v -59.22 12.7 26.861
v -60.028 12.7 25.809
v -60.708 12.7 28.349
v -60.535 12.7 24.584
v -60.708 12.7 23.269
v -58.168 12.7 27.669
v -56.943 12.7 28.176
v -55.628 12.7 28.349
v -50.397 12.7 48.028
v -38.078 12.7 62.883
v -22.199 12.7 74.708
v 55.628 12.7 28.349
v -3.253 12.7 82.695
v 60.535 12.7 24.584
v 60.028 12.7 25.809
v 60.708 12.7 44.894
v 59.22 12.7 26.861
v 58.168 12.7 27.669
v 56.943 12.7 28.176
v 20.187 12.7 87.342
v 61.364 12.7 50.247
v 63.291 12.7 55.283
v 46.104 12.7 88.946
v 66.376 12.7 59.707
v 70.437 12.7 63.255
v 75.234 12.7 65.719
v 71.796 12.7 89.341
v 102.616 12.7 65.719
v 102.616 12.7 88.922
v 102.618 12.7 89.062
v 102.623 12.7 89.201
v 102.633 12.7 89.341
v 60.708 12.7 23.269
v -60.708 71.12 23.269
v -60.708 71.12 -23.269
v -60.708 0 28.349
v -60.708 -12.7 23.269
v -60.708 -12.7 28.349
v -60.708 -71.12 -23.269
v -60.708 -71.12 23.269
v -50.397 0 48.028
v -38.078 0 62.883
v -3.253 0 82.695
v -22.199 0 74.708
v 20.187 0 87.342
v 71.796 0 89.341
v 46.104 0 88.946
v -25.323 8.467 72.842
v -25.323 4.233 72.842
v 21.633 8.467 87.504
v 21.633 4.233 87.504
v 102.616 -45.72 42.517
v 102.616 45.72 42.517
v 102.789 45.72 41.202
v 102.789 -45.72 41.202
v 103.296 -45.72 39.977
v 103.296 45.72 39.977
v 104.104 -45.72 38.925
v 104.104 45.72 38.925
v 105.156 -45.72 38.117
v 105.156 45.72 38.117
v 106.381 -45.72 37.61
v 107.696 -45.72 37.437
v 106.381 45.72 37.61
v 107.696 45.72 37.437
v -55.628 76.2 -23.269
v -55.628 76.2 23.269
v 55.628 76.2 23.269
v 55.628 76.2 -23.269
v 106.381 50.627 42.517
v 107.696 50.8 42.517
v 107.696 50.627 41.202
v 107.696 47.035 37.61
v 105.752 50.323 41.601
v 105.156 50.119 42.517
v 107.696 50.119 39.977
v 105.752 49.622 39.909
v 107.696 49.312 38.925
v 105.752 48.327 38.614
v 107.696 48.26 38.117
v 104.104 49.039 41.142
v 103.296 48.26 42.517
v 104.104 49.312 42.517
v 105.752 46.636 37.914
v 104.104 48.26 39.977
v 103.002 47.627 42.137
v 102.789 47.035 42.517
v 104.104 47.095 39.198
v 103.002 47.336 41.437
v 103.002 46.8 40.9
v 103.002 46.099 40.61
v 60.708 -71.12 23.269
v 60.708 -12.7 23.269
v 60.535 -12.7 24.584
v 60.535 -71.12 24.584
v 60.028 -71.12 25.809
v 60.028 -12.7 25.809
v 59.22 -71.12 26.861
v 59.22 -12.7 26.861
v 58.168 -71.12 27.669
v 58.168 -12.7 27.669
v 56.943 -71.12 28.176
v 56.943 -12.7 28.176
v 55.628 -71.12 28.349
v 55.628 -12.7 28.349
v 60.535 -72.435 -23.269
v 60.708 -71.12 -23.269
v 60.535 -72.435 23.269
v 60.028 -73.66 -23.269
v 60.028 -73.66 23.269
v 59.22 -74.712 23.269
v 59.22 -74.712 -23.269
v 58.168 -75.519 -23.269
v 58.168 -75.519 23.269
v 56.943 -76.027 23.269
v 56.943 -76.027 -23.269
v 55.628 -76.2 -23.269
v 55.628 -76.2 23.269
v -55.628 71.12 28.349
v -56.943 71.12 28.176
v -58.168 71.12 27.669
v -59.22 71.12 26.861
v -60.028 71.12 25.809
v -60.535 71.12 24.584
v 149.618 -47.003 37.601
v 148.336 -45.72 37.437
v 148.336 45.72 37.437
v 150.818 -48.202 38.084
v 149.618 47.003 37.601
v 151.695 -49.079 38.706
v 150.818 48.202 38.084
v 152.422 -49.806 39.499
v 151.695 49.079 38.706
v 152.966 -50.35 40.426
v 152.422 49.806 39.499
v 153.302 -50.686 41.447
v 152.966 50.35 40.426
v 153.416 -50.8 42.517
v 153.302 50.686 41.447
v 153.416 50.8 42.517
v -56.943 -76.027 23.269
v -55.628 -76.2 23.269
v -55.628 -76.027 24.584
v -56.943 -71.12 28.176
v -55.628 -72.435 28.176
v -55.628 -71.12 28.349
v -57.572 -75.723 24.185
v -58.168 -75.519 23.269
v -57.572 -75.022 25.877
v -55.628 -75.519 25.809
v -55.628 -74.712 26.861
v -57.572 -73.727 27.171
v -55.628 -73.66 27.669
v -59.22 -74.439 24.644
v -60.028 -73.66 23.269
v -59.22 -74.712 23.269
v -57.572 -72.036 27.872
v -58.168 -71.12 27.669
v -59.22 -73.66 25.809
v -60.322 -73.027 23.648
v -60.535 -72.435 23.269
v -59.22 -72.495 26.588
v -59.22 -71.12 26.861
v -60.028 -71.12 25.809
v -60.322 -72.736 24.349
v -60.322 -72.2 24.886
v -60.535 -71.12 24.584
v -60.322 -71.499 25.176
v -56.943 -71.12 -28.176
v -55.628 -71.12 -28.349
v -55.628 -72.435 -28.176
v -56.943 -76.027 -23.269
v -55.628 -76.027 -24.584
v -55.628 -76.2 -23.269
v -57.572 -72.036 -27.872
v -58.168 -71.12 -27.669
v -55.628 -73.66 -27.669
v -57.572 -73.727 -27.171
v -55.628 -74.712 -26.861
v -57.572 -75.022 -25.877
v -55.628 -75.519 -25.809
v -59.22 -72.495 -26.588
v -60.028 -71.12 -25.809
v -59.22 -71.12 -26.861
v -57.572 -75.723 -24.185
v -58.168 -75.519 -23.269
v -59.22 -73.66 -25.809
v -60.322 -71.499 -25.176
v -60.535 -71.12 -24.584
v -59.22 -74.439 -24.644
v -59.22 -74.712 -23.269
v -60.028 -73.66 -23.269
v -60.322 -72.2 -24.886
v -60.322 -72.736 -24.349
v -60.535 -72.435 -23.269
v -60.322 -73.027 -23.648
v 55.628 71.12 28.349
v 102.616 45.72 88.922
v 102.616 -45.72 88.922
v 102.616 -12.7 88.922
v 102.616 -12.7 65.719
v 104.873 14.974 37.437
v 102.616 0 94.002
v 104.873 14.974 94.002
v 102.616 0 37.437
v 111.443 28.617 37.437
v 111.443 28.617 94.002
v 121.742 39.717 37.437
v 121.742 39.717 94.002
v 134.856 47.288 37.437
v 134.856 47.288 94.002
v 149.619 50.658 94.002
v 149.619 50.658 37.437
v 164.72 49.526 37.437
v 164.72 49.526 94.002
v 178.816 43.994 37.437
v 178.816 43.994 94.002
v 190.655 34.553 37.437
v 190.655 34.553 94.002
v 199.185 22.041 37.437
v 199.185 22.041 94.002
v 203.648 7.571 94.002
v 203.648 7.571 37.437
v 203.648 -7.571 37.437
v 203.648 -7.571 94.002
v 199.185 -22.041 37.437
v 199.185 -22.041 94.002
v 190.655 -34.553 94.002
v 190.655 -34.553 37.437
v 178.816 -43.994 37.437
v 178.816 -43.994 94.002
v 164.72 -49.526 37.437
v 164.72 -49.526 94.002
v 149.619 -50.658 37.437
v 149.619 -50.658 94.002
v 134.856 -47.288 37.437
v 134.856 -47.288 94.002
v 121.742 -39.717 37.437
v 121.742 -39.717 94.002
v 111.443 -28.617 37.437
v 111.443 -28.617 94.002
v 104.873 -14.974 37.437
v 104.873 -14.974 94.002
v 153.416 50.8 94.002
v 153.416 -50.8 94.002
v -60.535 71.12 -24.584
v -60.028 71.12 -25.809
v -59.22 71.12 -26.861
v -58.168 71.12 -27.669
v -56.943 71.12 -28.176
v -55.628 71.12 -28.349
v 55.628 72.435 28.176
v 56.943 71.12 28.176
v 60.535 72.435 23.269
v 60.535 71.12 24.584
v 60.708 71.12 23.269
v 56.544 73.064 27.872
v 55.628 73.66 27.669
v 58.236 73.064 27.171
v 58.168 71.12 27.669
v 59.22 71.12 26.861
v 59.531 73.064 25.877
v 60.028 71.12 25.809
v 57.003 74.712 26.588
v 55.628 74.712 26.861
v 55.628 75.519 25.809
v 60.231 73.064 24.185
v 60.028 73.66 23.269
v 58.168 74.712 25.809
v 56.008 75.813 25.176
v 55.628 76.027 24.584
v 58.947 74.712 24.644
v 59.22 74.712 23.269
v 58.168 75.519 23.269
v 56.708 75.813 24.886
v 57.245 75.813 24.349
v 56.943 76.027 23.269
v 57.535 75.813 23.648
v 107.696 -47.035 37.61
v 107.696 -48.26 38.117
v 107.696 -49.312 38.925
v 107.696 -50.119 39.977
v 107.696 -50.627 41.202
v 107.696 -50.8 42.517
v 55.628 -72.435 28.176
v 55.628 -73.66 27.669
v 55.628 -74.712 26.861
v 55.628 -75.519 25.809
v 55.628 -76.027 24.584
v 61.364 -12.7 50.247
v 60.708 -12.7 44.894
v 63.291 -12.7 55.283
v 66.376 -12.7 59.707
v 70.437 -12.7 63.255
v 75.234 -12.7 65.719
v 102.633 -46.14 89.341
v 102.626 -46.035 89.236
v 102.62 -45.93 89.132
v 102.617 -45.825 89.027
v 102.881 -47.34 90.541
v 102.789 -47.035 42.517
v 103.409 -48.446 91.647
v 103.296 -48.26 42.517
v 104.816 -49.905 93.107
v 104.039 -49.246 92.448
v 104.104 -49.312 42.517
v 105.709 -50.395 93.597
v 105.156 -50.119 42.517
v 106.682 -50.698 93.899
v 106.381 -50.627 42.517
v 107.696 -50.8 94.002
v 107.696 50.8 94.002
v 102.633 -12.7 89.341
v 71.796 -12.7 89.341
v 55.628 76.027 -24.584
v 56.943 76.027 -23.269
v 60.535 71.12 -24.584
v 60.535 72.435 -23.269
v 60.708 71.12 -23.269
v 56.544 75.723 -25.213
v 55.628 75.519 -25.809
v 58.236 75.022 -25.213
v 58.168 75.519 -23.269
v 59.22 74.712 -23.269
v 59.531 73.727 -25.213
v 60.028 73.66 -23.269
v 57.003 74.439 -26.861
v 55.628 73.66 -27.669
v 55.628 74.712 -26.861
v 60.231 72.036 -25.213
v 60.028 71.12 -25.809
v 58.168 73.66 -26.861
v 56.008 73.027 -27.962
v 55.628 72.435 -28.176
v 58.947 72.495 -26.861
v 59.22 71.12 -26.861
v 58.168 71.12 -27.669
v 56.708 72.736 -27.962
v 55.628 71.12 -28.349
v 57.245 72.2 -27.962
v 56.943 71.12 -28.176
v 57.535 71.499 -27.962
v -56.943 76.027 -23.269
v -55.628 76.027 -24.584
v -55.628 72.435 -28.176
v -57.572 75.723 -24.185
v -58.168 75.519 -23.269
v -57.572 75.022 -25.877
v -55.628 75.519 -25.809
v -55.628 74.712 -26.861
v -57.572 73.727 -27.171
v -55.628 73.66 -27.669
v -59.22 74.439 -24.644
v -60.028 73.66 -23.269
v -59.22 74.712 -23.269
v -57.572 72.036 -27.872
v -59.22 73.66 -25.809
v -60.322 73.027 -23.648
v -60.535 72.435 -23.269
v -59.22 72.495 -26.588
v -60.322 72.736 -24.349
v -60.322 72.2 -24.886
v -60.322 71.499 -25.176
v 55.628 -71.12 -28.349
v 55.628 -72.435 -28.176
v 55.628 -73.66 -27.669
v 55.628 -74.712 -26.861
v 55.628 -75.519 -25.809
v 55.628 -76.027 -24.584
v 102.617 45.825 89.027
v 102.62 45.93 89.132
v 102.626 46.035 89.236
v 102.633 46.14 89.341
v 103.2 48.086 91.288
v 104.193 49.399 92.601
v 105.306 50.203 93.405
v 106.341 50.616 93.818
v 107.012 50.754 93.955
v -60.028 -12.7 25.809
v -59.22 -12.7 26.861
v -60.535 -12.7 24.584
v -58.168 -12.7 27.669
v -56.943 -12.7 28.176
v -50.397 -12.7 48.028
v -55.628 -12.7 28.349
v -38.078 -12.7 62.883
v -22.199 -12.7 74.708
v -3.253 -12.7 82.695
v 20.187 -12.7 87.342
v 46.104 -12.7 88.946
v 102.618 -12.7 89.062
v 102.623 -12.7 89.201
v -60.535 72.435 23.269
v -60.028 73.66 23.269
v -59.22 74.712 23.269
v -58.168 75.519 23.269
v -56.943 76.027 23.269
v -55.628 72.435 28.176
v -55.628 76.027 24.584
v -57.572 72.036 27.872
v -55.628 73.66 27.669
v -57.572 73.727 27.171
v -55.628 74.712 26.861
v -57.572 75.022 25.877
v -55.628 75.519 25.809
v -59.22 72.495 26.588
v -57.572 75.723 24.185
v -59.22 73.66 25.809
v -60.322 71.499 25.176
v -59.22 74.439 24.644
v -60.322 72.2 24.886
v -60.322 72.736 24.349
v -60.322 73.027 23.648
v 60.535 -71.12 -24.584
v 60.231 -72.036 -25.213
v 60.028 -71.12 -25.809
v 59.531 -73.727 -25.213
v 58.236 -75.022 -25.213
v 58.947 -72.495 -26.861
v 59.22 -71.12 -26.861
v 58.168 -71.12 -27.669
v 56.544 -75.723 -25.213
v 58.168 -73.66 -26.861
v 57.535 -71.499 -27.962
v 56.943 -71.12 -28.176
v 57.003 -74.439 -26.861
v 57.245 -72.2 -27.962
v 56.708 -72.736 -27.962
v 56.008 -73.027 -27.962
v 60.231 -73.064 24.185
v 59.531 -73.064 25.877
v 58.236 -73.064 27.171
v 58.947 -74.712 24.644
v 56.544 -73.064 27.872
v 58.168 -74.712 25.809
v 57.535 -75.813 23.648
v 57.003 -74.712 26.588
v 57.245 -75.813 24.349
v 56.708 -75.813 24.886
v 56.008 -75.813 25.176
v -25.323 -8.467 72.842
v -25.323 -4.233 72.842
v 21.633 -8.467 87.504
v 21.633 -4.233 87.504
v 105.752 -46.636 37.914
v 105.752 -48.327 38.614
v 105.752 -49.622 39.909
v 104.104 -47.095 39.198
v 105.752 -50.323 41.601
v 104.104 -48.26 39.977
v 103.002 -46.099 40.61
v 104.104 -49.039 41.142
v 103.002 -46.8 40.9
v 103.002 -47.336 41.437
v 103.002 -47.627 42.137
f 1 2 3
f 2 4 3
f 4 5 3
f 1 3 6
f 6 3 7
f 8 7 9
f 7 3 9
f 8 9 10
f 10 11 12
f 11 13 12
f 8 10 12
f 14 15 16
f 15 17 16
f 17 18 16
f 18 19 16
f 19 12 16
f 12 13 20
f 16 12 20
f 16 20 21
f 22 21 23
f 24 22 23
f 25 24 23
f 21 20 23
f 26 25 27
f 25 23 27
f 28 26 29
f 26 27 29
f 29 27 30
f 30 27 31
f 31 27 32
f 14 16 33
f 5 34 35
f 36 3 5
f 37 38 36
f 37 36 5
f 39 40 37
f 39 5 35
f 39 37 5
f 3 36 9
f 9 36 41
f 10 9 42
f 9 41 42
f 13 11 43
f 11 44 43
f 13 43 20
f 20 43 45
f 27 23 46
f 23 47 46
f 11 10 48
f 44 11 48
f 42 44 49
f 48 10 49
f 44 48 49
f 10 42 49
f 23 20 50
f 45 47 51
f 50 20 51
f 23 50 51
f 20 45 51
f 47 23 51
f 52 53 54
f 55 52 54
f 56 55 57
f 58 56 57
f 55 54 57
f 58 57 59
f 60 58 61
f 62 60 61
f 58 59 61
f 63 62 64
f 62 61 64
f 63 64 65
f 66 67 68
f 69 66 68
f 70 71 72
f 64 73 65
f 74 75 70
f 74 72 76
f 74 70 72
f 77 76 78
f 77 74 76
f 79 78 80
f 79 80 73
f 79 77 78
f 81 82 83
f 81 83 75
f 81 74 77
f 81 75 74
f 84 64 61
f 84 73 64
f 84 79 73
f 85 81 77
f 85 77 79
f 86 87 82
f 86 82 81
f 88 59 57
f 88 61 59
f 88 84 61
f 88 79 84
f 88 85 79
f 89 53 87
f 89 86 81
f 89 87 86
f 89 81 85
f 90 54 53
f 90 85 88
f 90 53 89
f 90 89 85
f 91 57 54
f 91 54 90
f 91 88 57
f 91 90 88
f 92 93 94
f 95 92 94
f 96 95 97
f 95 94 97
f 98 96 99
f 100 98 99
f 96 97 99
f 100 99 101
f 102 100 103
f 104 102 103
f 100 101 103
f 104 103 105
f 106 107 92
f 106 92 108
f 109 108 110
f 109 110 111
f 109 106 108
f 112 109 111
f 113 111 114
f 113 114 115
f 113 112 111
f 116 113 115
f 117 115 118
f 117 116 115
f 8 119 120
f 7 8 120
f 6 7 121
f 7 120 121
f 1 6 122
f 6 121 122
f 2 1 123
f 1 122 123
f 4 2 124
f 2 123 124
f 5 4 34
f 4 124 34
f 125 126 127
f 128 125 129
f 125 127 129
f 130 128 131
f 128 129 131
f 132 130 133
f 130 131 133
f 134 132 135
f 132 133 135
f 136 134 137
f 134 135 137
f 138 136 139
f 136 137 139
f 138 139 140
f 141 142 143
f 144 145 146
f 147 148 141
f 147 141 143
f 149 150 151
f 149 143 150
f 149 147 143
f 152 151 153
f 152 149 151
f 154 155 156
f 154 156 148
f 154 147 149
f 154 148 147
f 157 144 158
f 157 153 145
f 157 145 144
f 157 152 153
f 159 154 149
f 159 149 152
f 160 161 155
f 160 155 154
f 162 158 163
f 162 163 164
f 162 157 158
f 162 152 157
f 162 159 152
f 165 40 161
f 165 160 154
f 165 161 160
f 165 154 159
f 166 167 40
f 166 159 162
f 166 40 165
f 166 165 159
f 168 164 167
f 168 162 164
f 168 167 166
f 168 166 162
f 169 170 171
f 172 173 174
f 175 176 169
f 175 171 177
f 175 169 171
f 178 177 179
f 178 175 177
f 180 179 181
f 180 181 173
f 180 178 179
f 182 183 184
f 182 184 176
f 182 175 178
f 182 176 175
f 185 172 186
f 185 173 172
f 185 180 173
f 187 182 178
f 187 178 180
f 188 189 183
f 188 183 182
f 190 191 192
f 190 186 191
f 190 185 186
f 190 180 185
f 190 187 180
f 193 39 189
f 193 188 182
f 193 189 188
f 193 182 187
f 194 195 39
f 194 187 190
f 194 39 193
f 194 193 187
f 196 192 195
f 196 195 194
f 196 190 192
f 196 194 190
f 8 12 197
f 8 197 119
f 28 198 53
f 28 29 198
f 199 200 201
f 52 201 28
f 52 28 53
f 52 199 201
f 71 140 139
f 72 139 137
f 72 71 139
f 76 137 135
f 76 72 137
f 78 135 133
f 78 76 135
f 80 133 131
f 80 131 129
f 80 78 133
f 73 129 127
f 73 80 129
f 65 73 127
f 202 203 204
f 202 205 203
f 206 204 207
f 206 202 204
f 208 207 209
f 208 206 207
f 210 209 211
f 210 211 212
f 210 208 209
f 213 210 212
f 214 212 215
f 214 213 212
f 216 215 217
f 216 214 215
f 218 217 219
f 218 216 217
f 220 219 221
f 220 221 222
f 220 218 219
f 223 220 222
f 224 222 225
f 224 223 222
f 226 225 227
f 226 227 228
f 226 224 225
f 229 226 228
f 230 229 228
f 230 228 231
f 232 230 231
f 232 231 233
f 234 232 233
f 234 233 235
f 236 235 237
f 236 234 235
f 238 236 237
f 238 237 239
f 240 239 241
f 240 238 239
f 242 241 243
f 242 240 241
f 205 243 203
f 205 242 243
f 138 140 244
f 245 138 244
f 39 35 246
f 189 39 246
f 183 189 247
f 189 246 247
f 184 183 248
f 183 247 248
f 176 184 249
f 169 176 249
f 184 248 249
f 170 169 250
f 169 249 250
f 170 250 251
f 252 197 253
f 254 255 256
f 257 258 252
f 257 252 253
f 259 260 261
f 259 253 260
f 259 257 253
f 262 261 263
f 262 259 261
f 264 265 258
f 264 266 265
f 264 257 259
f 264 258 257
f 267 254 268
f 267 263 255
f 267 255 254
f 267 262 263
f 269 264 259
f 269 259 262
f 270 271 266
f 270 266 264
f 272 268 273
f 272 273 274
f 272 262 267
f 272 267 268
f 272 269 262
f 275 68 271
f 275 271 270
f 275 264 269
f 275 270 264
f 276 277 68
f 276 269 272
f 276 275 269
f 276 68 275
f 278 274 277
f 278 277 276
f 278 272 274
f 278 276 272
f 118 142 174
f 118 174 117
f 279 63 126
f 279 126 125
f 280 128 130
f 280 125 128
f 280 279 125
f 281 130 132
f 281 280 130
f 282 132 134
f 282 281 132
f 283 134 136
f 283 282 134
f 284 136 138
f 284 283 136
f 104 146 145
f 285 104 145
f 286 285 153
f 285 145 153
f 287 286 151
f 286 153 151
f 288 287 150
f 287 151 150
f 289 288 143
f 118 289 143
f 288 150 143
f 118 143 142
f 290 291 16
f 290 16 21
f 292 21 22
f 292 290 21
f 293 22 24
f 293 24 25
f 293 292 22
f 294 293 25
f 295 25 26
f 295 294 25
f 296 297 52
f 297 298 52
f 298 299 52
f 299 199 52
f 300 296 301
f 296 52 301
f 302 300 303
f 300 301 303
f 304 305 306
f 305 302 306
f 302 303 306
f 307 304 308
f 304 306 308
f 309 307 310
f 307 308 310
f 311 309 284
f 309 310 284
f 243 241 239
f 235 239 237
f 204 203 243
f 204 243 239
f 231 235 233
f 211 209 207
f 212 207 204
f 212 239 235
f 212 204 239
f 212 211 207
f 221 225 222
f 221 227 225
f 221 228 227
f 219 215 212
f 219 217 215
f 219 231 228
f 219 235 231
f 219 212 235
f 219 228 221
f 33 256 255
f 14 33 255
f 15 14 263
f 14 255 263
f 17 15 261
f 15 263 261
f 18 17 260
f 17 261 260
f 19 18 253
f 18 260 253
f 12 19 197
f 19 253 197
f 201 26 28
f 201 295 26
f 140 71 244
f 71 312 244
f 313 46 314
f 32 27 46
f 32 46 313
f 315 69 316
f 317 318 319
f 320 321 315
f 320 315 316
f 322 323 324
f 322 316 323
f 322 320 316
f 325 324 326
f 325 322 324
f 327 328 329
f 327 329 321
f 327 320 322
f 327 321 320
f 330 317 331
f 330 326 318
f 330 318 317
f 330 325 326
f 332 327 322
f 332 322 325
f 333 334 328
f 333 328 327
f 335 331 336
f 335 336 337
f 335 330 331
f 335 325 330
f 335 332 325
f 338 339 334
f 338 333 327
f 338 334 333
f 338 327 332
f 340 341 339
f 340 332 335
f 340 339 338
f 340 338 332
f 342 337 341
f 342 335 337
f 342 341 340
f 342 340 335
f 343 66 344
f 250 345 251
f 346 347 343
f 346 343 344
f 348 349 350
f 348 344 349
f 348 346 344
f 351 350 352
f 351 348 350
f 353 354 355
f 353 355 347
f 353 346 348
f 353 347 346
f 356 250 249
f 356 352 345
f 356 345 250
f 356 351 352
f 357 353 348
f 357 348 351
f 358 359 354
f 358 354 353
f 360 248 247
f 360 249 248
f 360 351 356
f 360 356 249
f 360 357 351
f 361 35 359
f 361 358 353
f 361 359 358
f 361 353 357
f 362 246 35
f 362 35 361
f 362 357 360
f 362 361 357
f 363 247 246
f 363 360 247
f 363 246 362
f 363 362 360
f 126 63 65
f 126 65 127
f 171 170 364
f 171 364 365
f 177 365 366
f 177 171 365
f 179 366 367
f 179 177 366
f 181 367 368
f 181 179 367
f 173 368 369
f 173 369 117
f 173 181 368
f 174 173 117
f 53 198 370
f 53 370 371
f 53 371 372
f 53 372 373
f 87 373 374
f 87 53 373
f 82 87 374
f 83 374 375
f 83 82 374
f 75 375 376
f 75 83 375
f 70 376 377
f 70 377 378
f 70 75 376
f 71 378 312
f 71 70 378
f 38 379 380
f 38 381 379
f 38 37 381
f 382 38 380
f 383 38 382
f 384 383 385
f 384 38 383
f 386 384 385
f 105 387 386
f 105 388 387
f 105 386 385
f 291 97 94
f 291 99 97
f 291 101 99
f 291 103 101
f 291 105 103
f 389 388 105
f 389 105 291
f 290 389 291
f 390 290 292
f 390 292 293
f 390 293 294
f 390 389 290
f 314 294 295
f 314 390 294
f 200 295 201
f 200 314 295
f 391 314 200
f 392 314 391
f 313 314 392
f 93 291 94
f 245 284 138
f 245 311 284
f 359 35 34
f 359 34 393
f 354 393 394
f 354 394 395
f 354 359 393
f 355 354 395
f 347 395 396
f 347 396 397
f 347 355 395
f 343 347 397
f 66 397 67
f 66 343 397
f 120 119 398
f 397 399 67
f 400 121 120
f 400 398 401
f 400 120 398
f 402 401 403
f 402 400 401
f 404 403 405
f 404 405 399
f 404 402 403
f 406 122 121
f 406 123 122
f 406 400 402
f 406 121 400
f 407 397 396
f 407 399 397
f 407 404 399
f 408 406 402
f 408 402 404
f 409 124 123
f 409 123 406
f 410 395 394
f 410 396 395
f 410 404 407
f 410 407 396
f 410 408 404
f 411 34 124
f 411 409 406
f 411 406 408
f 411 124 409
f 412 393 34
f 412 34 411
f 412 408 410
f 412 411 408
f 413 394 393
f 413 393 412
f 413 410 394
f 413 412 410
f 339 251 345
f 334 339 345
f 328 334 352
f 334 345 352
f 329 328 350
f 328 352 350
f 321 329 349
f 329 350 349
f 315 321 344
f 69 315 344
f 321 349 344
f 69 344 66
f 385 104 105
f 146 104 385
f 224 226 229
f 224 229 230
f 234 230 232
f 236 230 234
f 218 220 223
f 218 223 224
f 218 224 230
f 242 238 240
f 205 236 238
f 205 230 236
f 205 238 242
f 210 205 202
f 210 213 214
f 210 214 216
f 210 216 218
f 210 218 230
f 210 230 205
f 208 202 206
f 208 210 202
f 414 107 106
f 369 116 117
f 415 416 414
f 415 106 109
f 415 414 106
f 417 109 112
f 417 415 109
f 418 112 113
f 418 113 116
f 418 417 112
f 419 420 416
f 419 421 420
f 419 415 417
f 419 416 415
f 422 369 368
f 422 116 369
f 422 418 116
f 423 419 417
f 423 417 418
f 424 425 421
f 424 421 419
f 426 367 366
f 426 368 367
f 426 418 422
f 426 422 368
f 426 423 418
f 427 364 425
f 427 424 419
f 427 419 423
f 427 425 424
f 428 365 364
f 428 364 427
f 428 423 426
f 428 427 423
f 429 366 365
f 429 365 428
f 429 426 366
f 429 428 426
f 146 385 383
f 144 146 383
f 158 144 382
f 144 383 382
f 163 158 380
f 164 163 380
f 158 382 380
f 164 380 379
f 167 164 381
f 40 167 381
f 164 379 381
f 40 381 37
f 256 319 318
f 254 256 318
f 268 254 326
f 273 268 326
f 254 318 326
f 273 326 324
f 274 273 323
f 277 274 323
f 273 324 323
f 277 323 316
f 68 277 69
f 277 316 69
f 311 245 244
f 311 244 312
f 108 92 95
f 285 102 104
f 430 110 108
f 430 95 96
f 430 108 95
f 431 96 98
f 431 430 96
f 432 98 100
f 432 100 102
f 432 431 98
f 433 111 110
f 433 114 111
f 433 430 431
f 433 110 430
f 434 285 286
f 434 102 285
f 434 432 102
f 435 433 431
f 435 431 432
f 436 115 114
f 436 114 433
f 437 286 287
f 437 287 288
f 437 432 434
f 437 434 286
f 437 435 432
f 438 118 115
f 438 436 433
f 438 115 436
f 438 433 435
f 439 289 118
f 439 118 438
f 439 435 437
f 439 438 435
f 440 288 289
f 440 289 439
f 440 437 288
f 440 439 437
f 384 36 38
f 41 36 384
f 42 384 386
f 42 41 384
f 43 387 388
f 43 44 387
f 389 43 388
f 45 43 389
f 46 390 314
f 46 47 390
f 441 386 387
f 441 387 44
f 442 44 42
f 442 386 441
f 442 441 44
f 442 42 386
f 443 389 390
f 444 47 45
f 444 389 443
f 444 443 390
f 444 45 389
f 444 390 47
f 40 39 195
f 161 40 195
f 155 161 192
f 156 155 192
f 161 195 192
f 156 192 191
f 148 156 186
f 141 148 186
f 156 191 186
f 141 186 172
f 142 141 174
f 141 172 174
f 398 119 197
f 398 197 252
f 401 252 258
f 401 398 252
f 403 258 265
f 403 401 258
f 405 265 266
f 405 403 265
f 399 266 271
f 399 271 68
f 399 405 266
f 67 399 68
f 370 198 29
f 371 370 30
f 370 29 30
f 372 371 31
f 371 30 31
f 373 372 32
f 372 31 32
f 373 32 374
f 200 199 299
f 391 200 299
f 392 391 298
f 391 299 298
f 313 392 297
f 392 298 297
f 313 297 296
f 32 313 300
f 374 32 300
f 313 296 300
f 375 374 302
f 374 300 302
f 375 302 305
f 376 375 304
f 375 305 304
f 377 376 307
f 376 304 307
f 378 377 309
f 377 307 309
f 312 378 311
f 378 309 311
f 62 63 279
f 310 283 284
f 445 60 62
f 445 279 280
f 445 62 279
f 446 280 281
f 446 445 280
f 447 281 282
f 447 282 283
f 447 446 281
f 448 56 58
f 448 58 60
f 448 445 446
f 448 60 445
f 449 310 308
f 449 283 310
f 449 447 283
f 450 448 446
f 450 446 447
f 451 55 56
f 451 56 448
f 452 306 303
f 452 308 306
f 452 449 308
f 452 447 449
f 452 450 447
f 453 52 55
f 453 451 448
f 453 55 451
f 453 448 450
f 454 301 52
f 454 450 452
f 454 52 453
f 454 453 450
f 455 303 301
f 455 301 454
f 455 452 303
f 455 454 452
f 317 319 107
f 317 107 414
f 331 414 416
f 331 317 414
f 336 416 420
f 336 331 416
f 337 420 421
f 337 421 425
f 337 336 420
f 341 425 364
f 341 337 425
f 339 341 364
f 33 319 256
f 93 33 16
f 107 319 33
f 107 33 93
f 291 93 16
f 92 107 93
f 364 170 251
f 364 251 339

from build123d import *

# Parameters (mm, degrees)
F1_DEPTH     = 76.2
F2_DEPTH     = 12.7
F3_DEPTH     = 50.8
F4_T1_DEPTH  = 111.2565687561
F4_T3_DEPTH  = 46.5381988824
F4_T5_DEPTH  = 58.42
F4_T7_DEPTH  = 58.42
F4_T9_DEPTH  = 142.24
F4_T11_DEPTH = 127
F4_T13_DEPTH = 64.1849718046
F4_T15_DEPTH = 58.42
F4_T17_DEPTH = 91.44
F4_S21_W     = 5.1816
F4_S21_H     = 5.1816
F4_T22_DEPTH = 5.1816
F4_S27_W     = 5.1816
F4_S27_H     = 5.1816
F4_T28_DEPTH = 5.1816
F4_S33_W     = 5.1816
F4_S33_H     = 5.1816
F4_T34_DEPTH = 5.1816
F4_S39_W     = 5.1816
F4_S39_H     = 5.1816
F4_T40_DEPTH = 5.1816
F4_S45_W     = 5.1816
F4_S45_H     = 5.1816
F4_T46_DEPTH = 5.1816
F4_S51_W     = 5.1816
F4_S51_H     = 5.1816
F4_T52_DEPTH = 5.1816
F4_S57_W     = 5.1816
F4_S57_H     = 5.1816
F4_T58_DEPTH = 5.1816
F4_S63_W     = 5.1816
F4_S63_H     = 5.1816
F4_T64_DEPTH = 5.1816
F4_S69_W     = 5.1816
F4_S69_H     = 5.1816
F4_T70_DEPTH = 5.1816
F4_S75_W     = 5.1816
F4_S75_H     = 5.1816
F4_T76_DEPTH = 5.1816
F4_T82_DEPTH = 127
F4_T87_DEPTH = 127
F4_T92_DEPTH = 127


# Not quite as in the source:
# - a fillet or chamfer that OpenCascade refuses, or shapes differently, is made with other operations: its cross-section is extruded or revolved along the edge and cut away or added


with BuildPart() as f1:
    # F0 (on Front) → F1 (new body, symmetric)
    with BuildSketch(Plane.XZ):
        Polygon((-60.7082843781, -28.3490994412), (60.7082843781, -28.3490994412), (60.7082843781, 28.3490994412), (37.0862856507, 28.3490994412), (-60.7082843781, 28.3490994412), align=None)
    extrude(amount=F1_DEPTH, both=True)

    # F0 (on Front) → F2 (join, symmetric)
    with BuildSketch(Plane.XZ):
        with BuildLine():
            add(Edge.make_bspline(
                [(-60.7082843781, 28.3490994412), (-33.8972061735, 93.4263938061), (22.8176377988, 88.2478274848), (71.7955373972, 89.3411468321)],
                knots=[0, 0, 0, 0, 145.8673802807, 145.8673802807, 145.8673802807, 145.8673802807], degree=3))
            Line((-60.7082843781, 28.3490994412), (37.0862856507, 28.3490994412))
            Line((37.0862856507, 28.3490994412), (37.0862856507, 44.8936835745))
            ThreePointArc((37.0862856507, 44.8936835745), (46.7916042484, 73.0907984395), (71.7955373972, 89.3411468321))
        make_face()
        with BuildLine():
            Line((37.0862856507, 28.3490994412), (60.7082843781, 28.3490994412))
            Line((60.7082843781, 28.3490994412), (60.7082843781, 44.8936835745))
            ThreePointArc((60.7082843781, 44.8936835745), (64.6984303206, 57.5891124549), (75.2339748927, 65.7191481047))
            Line((75.2339748927, 65.7191481047), (102.6157526561, 65.7191481047))
            Line((102.6157526561, 65.7191481047), (102.6157526561, 89.3411468321))
            Line((102.6157526561, 89.3411468321), (71.7955373972, 89.3411468321))
            ThreePointArc((71.7955373972, 89.3411468321), (46.7916042484, 73.0907984395), (37.0862856507, 44.8936835745))
            Line((37.0862856507, 44.8936835745), (37.0862856507, 28.3490994412))
        make_face()
    extrude(amount=F2_DEPTH, both=True)

    # F0 (on Front) → F3 (join, symmetric)
    with BuildSketch(Plane.XZ):
        Polygon((102.6157526561, 94.0016340071), (102.6157526561, 89.3411468321), (102.6157526561, 65.7191481047), (102.6157526561, 37.4366622024), (153.4157526561, 37.4366622024), (153.4157526561, 94.0016340071), align=None)
    extrude(amount=F3_DEPTH, both=True)

    # F4: fillet of radius 5.08 on 21 edges, made by hand

    # F4_s2 → F4_t1 (cut)
    with BuildSketch(Plane.YZ.offset(-55.6282843781)):
        with BuildLine():
            ThreePointArc((71.12, 28.3490994412), (74.7121024484, 26.8612018896), (76.2, 23.2690994412))
            Line((76.2, 23.2690994412), (76.2, 28.3490994412))
            Line((76.2, 28.3490994412), (71.12, 28.3490994412))
        make_face()
        with BuildLine():
            ThreePointArc((71.12, -28.3490994412), (74.7121024484, -26.8612018896), (76.2, -23.2690994412))
            Line((76.2, -23.2690994412), (76.2, -28.3490994412))
            Line((76.2, -28.3490994412), (71.12, -28.3490994412))
        make_face()
        with BuildLine():
            ThreePointArc((-71.12, 28.3490994412), (-74.7121024484, 26.8612018896), (-76.2, 23.2690994412))
            Line((-76.2, 23.2690994412), (-76.2, 28.3490994412))
            Line((-76.2, 28.3490994412), (-71.12, 28.3490994412))
        make_face()
        with BuildLine():
            ThreePointArc((-71.12, -28.3490994412), (-74.7121024484, -26.8612018896), (-76.2, -23.2690994412))
            Line((-76.2, -23.2690994412), (-76.2, -28.3490994412))
            Line((-76.2, -28.3490994412), (-71.12, -28.3490994412))
        make_face()
    extrude(amount=F4_T1_DEPTH, mode=Mode.SUBTRACT)

    # F4_s4 → F4_t3 (cut)
    with BuildSketch(Plane.XY.offset(-23.2690994412)):
        with BuildLine():
            ThreePointArc((-60.7082843781, 71.12), (-59.2203868265, 74.7121024484), (-55.6282843781, 76.2))
            Line((-55.6282843781, 76.2), (-60.7082843781, 76.2))
            Line((-60.7082843781, 76.2), (-60.7082843781, 71.12))
        make_face()
        with BuildLine():
            ThreePointArc((60.7082843781, 71.12), (59.2203868265, 74.7121024484), (55.6282843781, 76.2))
            Line((55.6282843781, 76.2), (60.7082843781, 76.2))
            Line((60.7082843781, 76.2), (60.7082843781, 71.12))
        make_face()
        with BuildLine():
            ThreePointArc((60.7082843781, -71.12), (59.2203868265, -74.7121024484), (55.6282843781, -76.2))
            Line((55.6282843781, -76.2), (60.7082843781, -76.2))
            Line((60.7082843781, -76.2), (60.7082843781, -71.12))
        make_face()
        with BuildLine():
            ThreePointArc((-60.7082843781, -71.12), (-59.2203868265, -74.7121024484), (-55.6282843781, -76.2))
            Line((-55.6282843781, -76.2), (-60.7082843781, -76.2))
            Line((-60.7082843781, -76.2), (-60.7082843781, -71.12))
        make_face()
    extrude(amount=F4_T3_DEPTH, mode=Mode.SUBTRACT)

    # F4_s6 → F4_t5 (cut)
    with BuildSketch(Plane.XZ.offset(-71.12)):
        with BuildLine():
            ThreePointArc((-55.6282843781, 28.3490994412), (-59.2203868265, 26.8612018896), (-60.7082843781, 23.2690994412))
            Line((-60.7082843781, 23.2690994412), (-60.7082843781, 28.3490994412))
            Line((-60.7082843781, 28.3490994412), (-55.6282843781, 28.3490994412))
        make_face()
        with BuildLine():
            ThreePointArc((60.7082843781, 23.2690994412), (59.2203868265, 26.8612018896), (55.6282843781, 28.3490994412))
            Line((55.6282843781, 28.3490994412), (60.7082843781, 28.3490994412))
            Line((60.7082843781, 28.3490994412), (60.7082843781, 23.2690994412))
        make_face()
    extrude(amount=F4_T5_DEPTH, mode=Mode.SUBTRACT)

    # F4_s8 → F4_t7 (cut)
    with BuildSketch(Plane.XZ.offset(12.7)):
        with BuildLine():
            ThreePointArc((-55.6282843781, 28.3490994412), (-59.2203868265, 26.8612018896), (-60.7082843781, 23.2690994412))
            Line((-60.7082843781, 23.2690994412), (-60.7082843781, 28.3490994412))
            Line((-60.7082843781, 28.3490994412), (-55.6282843781, 28.3490994412))
        make_face()
        with BuildLine():
            ThreePointArc((60.7082843781, 23.2690994412), (59.2203868265, 26.8612018896), (55.6282843781, 28.3490994412))
            Line((55.6282843781, 28.3490994412), (60.7082843781, 28.3490994412))
            Line((60.7082843781, 28.3490994412), (60.7082843781, 23.2690994412))
        make_face()
    extrude(amount=F4_T7_DEPTH, mode=Mode.SUBTRACT)

    # F4_s10 → F4_t9 (cut)
    with BuildSketch(Plane.XZ.offset(-71.12)):
        with BuildLine():
            ThreePointArc((-60.7082843781, -23.2690994412), (-59.2203868265, -26.8612018896), (-55.6282843781, -28.3490994412))
            Line((-55.6282843781, -28.3490994412), (-60.7082843781, -28.3490994412))
            Line((-60.7082843781, -28.3490994412), (-60.7082843781, -23.2690994412))
        make_face()
        with BuildLine():
            ThreePointArc((60.7082843781, -23.2690994412), (59.2203868265, -26.8612018896), (55.6282843781, -28.3490994412))
            Line((55.6282843781, -28.3490994412), (60.7082843781, -28.3490994412))
            Line((60.7082843781, -28.3490994412), (60.7082843781, -23.2690994412))
        make_face()
    extrude(amount=F4_T9_DEPTH, mode=Mode.SUBTRACT)

    # F4_s12 → F4_t11 (cut)
    with BuildSketch(Plane.XZ.offset(-63.5)):
        with BuildLine():
            ThreePointArc((148.3357526561, 37.4366622024), (151.9278551045, 38.924559754), (153.4157526561, 42.5166622024))
            Line((153.4157526561, 42.5166622024), (153.4157526561, 37.4366622024))
            Line((153.4157526561, 37.4366622024), (148.3357526561, 37.4366622024))
        make_face()
    extrude(amount=F4_T11_DEPTH, mode=Mode.SUBTRACT)

    # F4_s14 → F4_t13 (cut)
    with BuildSketch(Plane.XY.offset(42.5166622024)):
        with BuildLine():
            ThreePointArc((102.6157526561, -45.72), (104.1036502077, -49.3121024484), (107.6957526561, -50.8))
            Line((107.6957526561, -50.8), (102.6157526561, -50.8))
            Line((102.6157526561, -50.8), (102.6157526561, -45.72))
        make_face()
        with BuildLine():
            ThreePointArc((102.6157526561, 45.72), (104.1036502077, 49.3121024484), (107.6957526561, 50.8))
            Line((107.6957526561, 50.8), (102.6157526561, 50.8))
            Line((102.6157526561, 50.8), (102.6157526561, 45.72))
        make_face()
    extrude(amount=F4_T13_DEPTH, mode=Mode.SUBTRACT)

    # F4_s16 → F4_t15 (cut)
    with BuildSketch(Plane.YZ.offset(107.6957526561)):
        with BuildLine():
            ThreePointArc((-45.72, 37.4366622024), (-49.3121024484, 38.924559754), (-50.8, 42.5166622024))
            Line((-50.8, 42.5166622024), (-50.8, 37.4366622024))
            Line((-50.8, 37.4366622024), (-45.72, 37.4366622024))
        make_face()
        with BuildLine():
            ThreePointArc((50.8, 42.5166622024), (49.3121024484, 38.924559754), (45.72, 37.4366622024))
            Line((45.72, 37.4366622024), (50.8, 37.4366622024))
            Line((50.8, 37.4366622024), (50.8, 42.5166622024))
        make_face()
    extrude(amount=F4_T15_DEPTH, mode=Mode.SUBTRACT)

    # F4_s18 → F4_t17 (cut)
    with BuildSketch(Plane.XZ.offset(-45.72)):
        with BuildLine():
            ThreePointArc((102.6157526561, 42.5166622024), (104.1036502077, 38.924559754), (107.6957526561, 37.4366622024))
            Line((107.6957526561, 37.4366622024), (102.6157526561, 37.4366622024))
            Line((102.6157526561, 37.4366622024), (102.6157526561, 42.5166622024))
        make_face()
    extrude(amount=F4_T17_DEPTH, mode=Mode.SUBTRACT)


with BuildPart() as f4_tool20:
    # F4_s21 → F4_t22 (new body)
    with BuildSketch(Plane.YZ.offset(-55.6282843781)):
        with Locations((73.7108, 25.8598994412)):
            Rectangle(F4_S21_W, F4_S21_H)
    extrude(amount=-F4_T22_DEPTH)

    # F4_s23 → F4_t24 (revolve, cut)
    with BuildSketch(Plane(origin=(-55.6282843781, 71.12, 23.2690994412), x_dir=(0, -0.7071067812, -0.7071067812), z_dir=(0, 0.7071067812, -0.7071067812))):
        with BuildLine():
            ThreePointArc((0, -5.08), (5.08, 0), (0, 5.08))
            Line((0, 5.08), (0, -5.08))
        make_face()
    revolve(axis=Axis((-55.6282843781, 71.12, 23.2690994412), (-1, 0, 0)), mode=Mode.SUBTRACT)


with BuildPart() as f1_1:
    add(f1.part)

    # F4_t19: cut F4_tool20
    add(f4_tool20.part, mode=Mode.SUBTRACT)


with BuildPart() as f4_tool26:
    # F4_s27 → F4_t28 (new body)
    with BuildSketch(Plane.XZ.offset(-71.12)):
        with Locations((58.2190843781, 25.8598994412)):
            Rectangle(F4_S27_W, F4_S27_H)
    extrude(amount=-F4_T28_DEPTH)

    # F4_s29 → F4_t30 (revolve, cut)
    with BuildSketch(Plane(origin=(55.6282843781, 71.12, 23.2690994412), x_dir=(-0.7071067812, 0, -0.7071067812), z_dir=(0.7071067812, 0, -0.7071067812))):
        with BuildLine():
            ThreePointArc((0, -5.08), (5.08, 0), (0, 5.08))
            Line((0, 5.08), (0, -5.08))
        make_face()
    revolve(axis=Axis((55.6282843781, 71.12, 23.2690994412), (0, 1, 0)), mode=Mode.SUBTRACT)


with BuildPart() as f1_2:
    add(f1_1.part)

    # F4_t25: cut F4_tool26
    add(f4_tool26.part, mode=Mode.SUBTRACT)


with BuildPart() as f4_tool32:
    # F4_s33 → F4_t34 (new body)
    with BuildSketch(Plane.YZ.offset(-55.6282843781)):
        with Locations((73.7108, -25.8598994412)):
            Rectangle(F4_S33_W, F4_S33_H)
    extrude(amount=-F4_T34_DEPTH)

    # F4_s35 → F4_t36 (revolve, cut)
    with BuildSketch(Plane(origin=(-55.6282843781, 71.12, -23.2690994412), x_dir=(0, -0.7071067812, 0.7071067812), z_dir=(0, -0.7071067812, -0.7071067812))):
        with BuildLine():
            ThreePointArc((0, -5.08), (5.08, 0), (0, 5.08))
            Line((0, 5.08), (0, -5.08))
        make_face()
    revolve(axis=Axis((-55.6282843781, 71.12, -23.2690994412), (-1, 0, 0)), mode=Mode.SUBTRACT)


with BuildPart() as f1_3:
    add(f1_2.part)

    # F4_t31: cut F4_tool32
    add(f4_tool32.part, mode=Mode.SUBTRACT)


with BuildPart() as f4_tool38:
    # F4_s39 → F4_t40 (new body)
    with BuildSketch(Plane.XY.offset(-23.2690994412)):
        with Locations((58.2190843781, 73.7108)):
            Rectangle(F4_S39_W, F4_S39_H)
    extrude(amount=-F4_T40_DEPTH)

    # F4_s41 → F4_t42 (revolve, cut)
    with BuildSketch(Plane(origin=(55.6282843781, 71.12, -23.2690994412), x_dir=(-0.7071067812, -0.7071067812, 0), z_dir=(0.7071067812, -0.7071067812, 0))):
        with BuildLine():
            ThreePointArc((0, -5.08), (5.08, 0), (0, 5.08))
            Line((0, 5.08), (0, -5.08))
        make_face()
    revolve(axis=Axis((55.6282843781, 71.12, -23.2690994412), (0, 0, -1)), mode=Mode.SUBTRACT)


with BuildPart() as f1_4:
    add(f1_3.part)

    # F4_t37: cut F4_tool38
    add(f4_tool38.part, mode=Mode.SUBTRACT)


with BuildPart() as f4_tool44:
    # F4_s45 → F4_t46 (new body)
    with BuildSketch(Plane.YZ.offset(-55.6282843781)):
        with Locations((-73.7108, 25.8598994412)):
            Rectangle(F4_S45_W, F4_S45_H)
    extrude(amount=-F4_T46_DEPTH)

    # F4_s47 → F4_t48 (revolve, cut)
    with BuildSketch(Plane(origin=(-55.6282843781, -71.12, 23.2690994412), x_dir=(0, 0.7071067812, -0.7071067812), z_dir=(0, 0.7071067812, 0.7071067812))):
        with BuildLine():
            ThreePointArc((0, -5.08), (5.08, 0), (0, 5.08))
            Line((0, 5.08), (0, -5.08))
        make_face()
    revolve(axis=Axis((-55.6282843781, -71.12, 23.2690994412), (-1, 0, 0)), mode=Mode.SUBTRACT)


with BuildPart() as f1_5:
    add(f1_4.part)

    # F4_t43: cut F4_tool44
    add(f4_tool44.part, mode=Mode.SUBTRACT)


with BuildPart() as f4_tool50:
    # F4_s51 → F4_t52 (new body)
    with BuildSketch(Plane.XZ.offset(71.12)):
        with Locations((58.2190843781, 25.8598994412)):
            Rectangle(F4_S51_W, F4_S51_H)
    extrude(amount=F4_T52_DEPTH)

    # F4_s53 → F4_t54 (revolve, cut)
    with BuildSketch(Plane(origin=(55.6282843781, -71.12, 23.2690994412), x_dir=(-0.7071067812, 0, -0.7071067812), z_dir=(-0.7071067812, 0, 0.7071067812))):
        with BuildLine():
            ThreePointArc((0, -5.08), (5.08, 0), (0, 5.08))
            Line((0, 5.08), (0, -5.08))
        make_face()
    revolve(axis=Axis((55.6282843781, -71.12, 23.2690994412), (0, -1, 0)), mode=Mode.SUBTRACT)


with BuildPart() as f1_6:
    add(f1_5.part)

    # F4_t49: cut F4_tool50
    add(f4_tool50.part, mode=Mode.SUBTRACT)


with BuildPart() as f4_tool56:
    # F4_s57 → F4_t58 (new body)
    with BuildSketch(Plane.YZ.offset(-55.6282843781)):
        with Locations((-73.7108, -25.8598994412)):
            Rectangle(F4_S57_W, F4_S57_H)
    extrude(amount=-F4_T58_DEPTH)

    # F4_s59 → F4_t60 (revolve, cut)
    with BuildSketch(Plane(origin=(-55.6282843781, -71.12, -23.2690994412), x_dir=(0, 0.7071067812, 0.7071067812), z_dir=(0, -0.7071067812, 0.7071067812))):
        with BuildLine():
            ThreePointArc((0, -5.08), (5.08, 0), (0, 5.08))
            Line((0, 5.08), (0, -5.08))
        make_face()
    revolve(axis=Axis((-55.6282843781, -71.12, -23.2690994412), (-1, 0, 0)), mode=Mode.SUBTRACT)


with BuildPart() as f1_7:
    add(f1_6.part)

    # F4_t55: cut F4_tool56
    add(f4_tool56.part, mode=Mode.SUBTRACT)


with BuildPart() as f4_tool62:
    # F4_s63 → F4_t64 (new body)
    with BuildSketch(Plane.XY.offset(-23.2690994412)):
        with Locations((58.2190843781, -73.7108)):
            Rectangle(F4_S63_W, F4_S63_H)
    extrude(amount=-F4_T64_DEPTH)

    # F4_s65 → F4_t66 (revolve, cut)
    with BuildSketch(Plane(origin=(55.6282843781, -71.12, -23.2690994412), x_dir=(-0.7071067812, 0.7071067812, 0), z_dir=(-0.7071067812, -0.7071067812, 0))):
        with BuildLine():
            ThreePointArc((0, -5.08), (5.08, 0), (0, 5.08))
            Line((0, 5.08), (0, -5.08))
        make_face()
    revolve(axis=Axis((55.6282843781, -71.12, -23.2690994412), (0, 0, -1)), mode=Mode.SUBTRACT)


with BuildPart() as f1_8:
    add(f1_7.part)

    # F4_t61: cut F4_tool62
    add(f4_tool62.part, mode=Mode.SUBTRACT)


with BuildPart() as f4_tool68:
    # F4_s69 → F4_t70 (new body)
    with BuildSketch(Plane.YZ.offset(107.6957526561)):
        with Locations((-48.3108, 39.9258622024)):
            Rectangle(F4_S69_W, F4_S69_H)
    extrude(amount=-F4_T70_DEPTH)

    # F4_s71 → F4_t72 (revolve, cut)
    with BuildSketch(Plane(origin=(107.6957526561, -45.72, 42.5166622024), x_dir=(0, 0.7071067812, 0.7071067812), z_dir=(0, -0.7071067812, 0.7071067812))):
        with BuildLine():
            ThreePointArc((0, -5.08), (5.08, 0), (0, 5.08))
            Line((0, 5.08), (0, -5.08))
        make_face()
    revolve(axis=Axis((107.6957526561, -45.72, 42.5166622024), (-1, 0, 0)), mode=Mode.SUBTRACT)


with BuildPart() as f1_9:
    add(f1_8.part)

    # F4_t67: cut F4_tool68
    add(f4_tool68.part, mode=Mode.SUBTRACT)


with BuildPart() as f4_tool74:
    # F4_s75 → F4_t76 (new body)
    with BuildSketch(Plane.YZ.offset(107.6957526561)):
        with Locations((48.3108, 39.9258622024)):
            Rectangle(F4_S75_W, F4_S75_H)
    extrude(amount=-F4_T76_DEPTH)

    # F4_s77 → F4_t78 (revolve, cut)
    with BuildSketch(Plane(origin=(107.6957526561, 45.72, 42.5166622024), x_dir=(0, -0.7071067812, 0.7071067812), z_dir=(0, -0.7071067812, -0.7071067812))):
        with BuildLine():
            ThreePointArc((0, -5.08), (5.08, 0), (0, 5.08))
            Line((0, 5.08), (0, -5.08))
        make_face()
    revolve(axis=Axis((107.6957526561, 45.72, 42.5166622024), (-1, 0, 0)), mode=Mode.SUBTRACT)


with BuildPart() as f1_10:
    add(f1_9.part)

    # F4_t73: cut F4_tool74
    add(f4_tool74.part, mode=Mode.SUBTRACT)


with BuildPart() as f4_tool80:
    # F4_s81 → F4_t82 (new body)
    with BuildSketch(Plane.XZ.offset(63.5)):
        with BuildLine():
            ThreePointArc((102.6157526561, 88.9216340071), (104.1036502077, 92.5137364555), (107.6957526561, 94.0016340071))
            Line((107.6957526561, 94.0016340071), (102.6157526561, 94.0016340071))
            Line((102.6157526561, 94.0016340071), (102.6157526561, 88.9216340071))
        make_face()
    extrude(amount=-F4_T82_DEPTH)

    split(bisect_by=Plane.XZ.offset(12.7), keep=Keep.TOP)


with BuildPart() as f1_11:
    add(f1_10.part)

    # F4_t79: cut F4_tool80
    add(f4_tool80.part, mode=Mode.SUBTRACT)


with BuildPart() as f4_tool85:
    # F4_s86 → F4_t87 (new body)
    with BuildSketch(Plane.XZ.offset(63.5)):
        with BuildLine():
            ThreePointArc((102.6157526561, 88.9216340071), (104.1036502077, 92.5137364555), (107.6957526561, 94.0016340071))
            Line((107.6957526561, 94.0016340071), (102.6157526561, 94.0016340071))
            Line((102.6157526561, 94.0016340071), (102.6157526561, 88.9216340071))
        make_face()
    extrude(amount=-F4_T87_DEPTH)

    split(bisect_by=Plane.XY.offset(89.3411468321), keep=Keep.TOP)


with BuildPart() as f1_12:
    add(f1_11.part)

    # F4_t84: cut F4_tool85
    add(f4_tool85.part, mode=Mode.SUBTRACT)


with BuildPart() as f4_tool90:
    # F4_s91 → F4_t92 (new body)
    with BuildSketch(Plane.XZ.offset(63.5)):
        with BuildLine():
            ThreePointArc((102.6157526561, 88.9216340071), (104.1036502077, 92.5137364555), (107.6957526561, 94.0016340071))
            Line((107.6957526561, 94.0016340071), (102.6157526561, 94.0016340071))
            Line((102.6157526561, 94.0016340071), (102.6157526561, 88.9216340071))
        make_face()
    extrude(amount=-F4_T92_DEPTH)

    split(bisect_by=Plane.XZ.offset(-12.7), keep=Keep.BOTTOM)


with BuildPart() as f1_13:
    add(f1_12.part)

    # F4_t89: cut F4_tool90
    add(f4_tool90.part, mode=Mode.SUBTRACT)


with BuildPart() as f5:
    # F0 (on Front) → F5 (revolve)
    with BuildSketch(Plane.XZ):
        Polygon((102.6157526561, 94.0016340071), (102.6157526561, 89.3411468321), (102.6157526561, 65.7191481047), (102.6157526561, 37.4366622024), (153.4157526561, 37.4366622024), (153.4157526561, 94.0016340071), align=None)
    revolve(axis=Axis((153.4157526561, 0, 65.7191481047), (0, 0, -1)))


solid = Compound([f1_13.part, f5.part])
